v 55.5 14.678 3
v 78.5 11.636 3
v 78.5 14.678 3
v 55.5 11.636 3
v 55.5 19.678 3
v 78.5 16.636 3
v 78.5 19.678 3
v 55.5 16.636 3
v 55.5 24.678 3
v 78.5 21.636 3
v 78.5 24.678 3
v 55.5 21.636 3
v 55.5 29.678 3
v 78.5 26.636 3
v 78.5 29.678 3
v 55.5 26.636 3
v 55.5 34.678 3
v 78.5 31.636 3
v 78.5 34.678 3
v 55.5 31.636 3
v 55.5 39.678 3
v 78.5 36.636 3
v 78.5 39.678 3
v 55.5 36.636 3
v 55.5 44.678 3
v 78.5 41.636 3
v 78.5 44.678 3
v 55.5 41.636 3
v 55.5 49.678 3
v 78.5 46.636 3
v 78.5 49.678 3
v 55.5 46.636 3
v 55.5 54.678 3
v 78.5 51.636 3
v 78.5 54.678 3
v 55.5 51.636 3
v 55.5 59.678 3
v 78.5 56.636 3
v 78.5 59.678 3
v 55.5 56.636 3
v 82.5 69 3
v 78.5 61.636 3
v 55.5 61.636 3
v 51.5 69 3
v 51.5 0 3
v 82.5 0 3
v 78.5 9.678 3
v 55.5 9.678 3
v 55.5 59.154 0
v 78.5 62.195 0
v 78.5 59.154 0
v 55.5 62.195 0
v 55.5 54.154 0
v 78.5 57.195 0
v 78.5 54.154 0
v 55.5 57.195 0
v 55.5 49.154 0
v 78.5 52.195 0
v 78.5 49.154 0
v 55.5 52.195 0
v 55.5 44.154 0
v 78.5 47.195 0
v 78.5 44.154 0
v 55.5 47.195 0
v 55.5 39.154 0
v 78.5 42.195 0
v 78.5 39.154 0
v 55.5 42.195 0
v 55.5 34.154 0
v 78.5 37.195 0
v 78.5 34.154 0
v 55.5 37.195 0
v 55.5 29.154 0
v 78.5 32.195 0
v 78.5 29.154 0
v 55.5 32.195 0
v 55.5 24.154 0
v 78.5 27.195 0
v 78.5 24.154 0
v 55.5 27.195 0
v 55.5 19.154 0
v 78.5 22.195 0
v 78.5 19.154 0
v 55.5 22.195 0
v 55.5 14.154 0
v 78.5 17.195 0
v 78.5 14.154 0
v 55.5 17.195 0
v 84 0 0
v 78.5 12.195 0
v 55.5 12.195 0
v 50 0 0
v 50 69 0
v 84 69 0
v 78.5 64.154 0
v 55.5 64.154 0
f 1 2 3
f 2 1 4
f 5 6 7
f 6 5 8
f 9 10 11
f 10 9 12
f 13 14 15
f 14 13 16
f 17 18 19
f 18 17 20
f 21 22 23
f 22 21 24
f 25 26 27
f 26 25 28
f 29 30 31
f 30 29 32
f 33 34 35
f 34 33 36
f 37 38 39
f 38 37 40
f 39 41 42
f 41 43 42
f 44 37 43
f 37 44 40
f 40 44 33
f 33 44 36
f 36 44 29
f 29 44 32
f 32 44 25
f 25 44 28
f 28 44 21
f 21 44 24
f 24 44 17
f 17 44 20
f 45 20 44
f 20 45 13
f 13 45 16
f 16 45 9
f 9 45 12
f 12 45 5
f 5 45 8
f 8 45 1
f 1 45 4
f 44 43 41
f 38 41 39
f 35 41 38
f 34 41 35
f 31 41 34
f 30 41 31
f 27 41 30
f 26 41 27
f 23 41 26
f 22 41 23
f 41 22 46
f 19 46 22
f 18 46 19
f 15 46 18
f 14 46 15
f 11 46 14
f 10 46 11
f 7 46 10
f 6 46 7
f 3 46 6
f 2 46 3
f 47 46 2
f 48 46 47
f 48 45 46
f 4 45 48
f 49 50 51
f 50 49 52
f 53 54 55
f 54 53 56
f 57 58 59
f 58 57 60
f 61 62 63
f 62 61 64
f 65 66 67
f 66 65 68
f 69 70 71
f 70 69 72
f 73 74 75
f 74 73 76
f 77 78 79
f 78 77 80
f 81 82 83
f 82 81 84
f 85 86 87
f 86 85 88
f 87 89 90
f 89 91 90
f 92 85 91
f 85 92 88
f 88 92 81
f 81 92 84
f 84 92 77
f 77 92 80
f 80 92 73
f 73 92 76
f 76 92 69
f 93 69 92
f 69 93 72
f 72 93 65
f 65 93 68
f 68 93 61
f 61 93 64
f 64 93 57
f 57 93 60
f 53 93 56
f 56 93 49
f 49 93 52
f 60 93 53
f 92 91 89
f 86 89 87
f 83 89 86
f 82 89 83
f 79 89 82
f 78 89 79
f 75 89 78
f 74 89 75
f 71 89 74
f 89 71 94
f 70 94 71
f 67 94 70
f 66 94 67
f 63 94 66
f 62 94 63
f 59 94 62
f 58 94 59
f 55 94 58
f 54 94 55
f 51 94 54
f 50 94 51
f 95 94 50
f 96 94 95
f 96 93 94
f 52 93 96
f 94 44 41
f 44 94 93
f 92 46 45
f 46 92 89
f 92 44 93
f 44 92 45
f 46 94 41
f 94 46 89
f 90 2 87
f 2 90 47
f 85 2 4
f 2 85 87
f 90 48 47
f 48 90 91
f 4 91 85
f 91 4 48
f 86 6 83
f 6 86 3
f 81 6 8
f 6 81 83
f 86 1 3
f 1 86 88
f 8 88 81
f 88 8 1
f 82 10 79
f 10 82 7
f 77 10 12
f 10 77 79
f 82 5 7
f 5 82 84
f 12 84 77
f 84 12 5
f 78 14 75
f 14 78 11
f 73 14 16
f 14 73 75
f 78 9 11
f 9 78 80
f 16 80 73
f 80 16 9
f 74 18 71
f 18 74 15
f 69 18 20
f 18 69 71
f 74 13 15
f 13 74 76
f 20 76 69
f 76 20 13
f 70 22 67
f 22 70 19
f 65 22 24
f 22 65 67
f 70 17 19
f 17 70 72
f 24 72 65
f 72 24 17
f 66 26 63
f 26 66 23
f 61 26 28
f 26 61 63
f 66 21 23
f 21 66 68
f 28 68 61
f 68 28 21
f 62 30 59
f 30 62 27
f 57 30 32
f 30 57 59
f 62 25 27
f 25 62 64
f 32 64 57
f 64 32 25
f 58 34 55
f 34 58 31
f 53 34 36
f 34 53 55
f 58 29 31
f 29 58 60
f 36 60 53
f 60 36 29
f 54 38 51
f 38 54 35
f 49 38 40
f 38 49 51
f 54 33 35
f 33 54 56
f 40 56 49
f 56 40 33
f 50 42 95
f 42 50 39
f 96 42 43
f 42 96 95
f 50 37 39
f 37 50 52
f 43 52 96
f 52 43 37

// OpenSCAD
// A small case for a wemos mini and a temp sensor appropriate for outside use not in
// direct rain. The case is intended to be mounted in with the positive y up to
// keep rain from entering the cavities.

// Size of a wemos d1 mini and sensor
wemos_x=26;
wemos_y=35;
wemos_z=12;
sense_y=30;

// opening for a usb plug
usb_w=14;
usb_h=8;

// louvered (y) wall thickness; needs to be thick enough to allow for holes
// that can keep mist/rain out
yt=3;

// non-louvered wall thickness (horizontal and back surfaces)
xt=2;

// Overall dimenstions of the outside of the case
case_x = wemos_x + 5 + 2*yt;
case_y = wemos_y + sense_y + 3 * xt;
case_z = wemos_z + xt + yt;
echo("case:", case_x, case_y, case_z);

$fs = 0.1;  // Don't generate smaller facets than 0.1 mm
$fa = 5;    // Don't generate larger angles than 5 degrees

module case() {
   module side_vent(d) {
      rotate([0, 0, 50]) cube([yt*2.3, 1.5, case_z-xt-yt]);
   }
   
   // These are for a #6 wood screw
   id = 3.75; // id of hole
   od = 7; // od of screw head
   shsf = 1.10; // small hole scale factor   
   bt = 4; // Thickness of boss

   difference() {
      union() {
         cube([case_x, case_y, xt]); // Back of case
         cube([yt, case_y, case_z]); //left side
         translate([case_x - yt, 0, 0]) cube([yt, case_y, case_z]); // right side
         cube([case_x, xt, case_z]); // bottom
         translate([0, case_y - xt, 0]) cube([case_x, xt, case_z]); // top
         
         // Support under the antenna
         translate([yt + 4, xt+wemos_y-4, xt])
            cube([wemos_x-3, 4, 2.3]);
         
         // wall between wemos and sensor cavity
         translate([0, wemos_y+xt, 0])
            cube([case_x, xt, case_z-yt]);

         // The mouting boss
         translate([case_x/2, wemos_y+xt+(od+2)/2+4, 0])
            cylinder(h=bt, d=od+2, $fn=100);
      }
      union() {
         // opening into sensor cavity
         translate([4, wemos_y-1+xt, 6])
            cube([4, 4, 20]);
         // And the usb port
         translate([case_x/2 - usb_w/2, -1, xt+0.01])
            cube([usb_w, xt*2, usb_h]);
         // The slot for the lid to go into
         translate([yt-1.5-0.125, xt-0.5, case_z-yt])
            lid(case_x-3+0.25, case_y-xt+2, yt+0.1, v=0);
         // The screwhole in the mounting boss
         translate([case_x/2, wemos_y+xt+(od+2)/2+4, -0.1])
            cylinder(h=bt+1, d=id*shsf, $fn=100);
         // and the countersink
         translate([case_x/2, wemos_y+xt+(od+2)/2+4, bt-3+0.1])
            cylinder(h=3, d1=id*shsf, d2=od*shsf, $fn=100);
        // side vent slots for the sensor section
        for(y=[wemos_y+xt+1:5:case_y-8])
         union() {
            translate([-0.1, y, yt+1])
               rotate([0,0,40]) cube([2*yt, 2, case_z-2*yt-2]) ;
            translate([case_x-4.5, y+4, yt+1])
               rotate([0,0,-40]) cube([2*yt, 2, case_z-2*yt-2]) ;
         }
      }
   }
   
}


module lid(w, h, t, v) {
   ww=1.5;
   echo("Lid:", w, h, t, ww);
   module top_vent() {
      translate([3, 0, 5])
         rotate([-50, 0, 0])
         cube([w - 2*ww - 8, t*3, 1.5]);
   }
   difference() {
      union() {
         translate([ww,0,0])
            cube([w-2*ww, h, t]); // center part of lid
         polyhedron(points=[[0,0,0], [ww,0,0], [ww,0,t],
                           [0,h,0], [ww,h,0], [ww,h,t]],
                    faces=[[0,1,2], [3,5,4],
                           [0,3,4,1], [0,2,5,3], [1,4,5,2]],
                    convexity=10);
         translate([w,0,0])
            mirror([1,0,0])
            polyhedron(points=[[0,0,0], [ww,0,0], [ww,0,t],
                               [0,h,0], [ww,h,0], [ww,h,t]],
                       faces=[[0,1,2], [3,5,4],
                              [0,3,4,1], [0,2,5,3], [1,4,5,2]],
                       convexity=10);
         
      }
      union() {
         // Some vent slots
         if (v>0)
            for(y=[8:5:h-8])
               translate([1+ww, y, 0])
                  top_vent();
      }
      
   }
}


module mounting_ear() {
   // These are for a #6 wood screw
   id = 3.75; // id of hole
   od = 7; // od of screw head
   shsf = 1.10; // small hole scale factor
   
   t = 4; // Thickness of ear
   w = od + 3;   // Width

   translate([w/2,w/2,2]) difference() {
      union() {
         cylinder(h=t,d=w,center=true,$fn=100);
         translate([-w/4,0,0])
            cube([w/2,w,t],center=true);
      };
      cylinder(h=t+2,d=id*shsf,center=true,$fn=100);
      translate([0,0,t-3]) cylinder(h=3, d1=id*shsf, d2=od*shsf, $fn=100, center=true);
   }
}


//case();
translate([50,0,0]) lid(case_x-3, case_y-xt, yt, v=1);
